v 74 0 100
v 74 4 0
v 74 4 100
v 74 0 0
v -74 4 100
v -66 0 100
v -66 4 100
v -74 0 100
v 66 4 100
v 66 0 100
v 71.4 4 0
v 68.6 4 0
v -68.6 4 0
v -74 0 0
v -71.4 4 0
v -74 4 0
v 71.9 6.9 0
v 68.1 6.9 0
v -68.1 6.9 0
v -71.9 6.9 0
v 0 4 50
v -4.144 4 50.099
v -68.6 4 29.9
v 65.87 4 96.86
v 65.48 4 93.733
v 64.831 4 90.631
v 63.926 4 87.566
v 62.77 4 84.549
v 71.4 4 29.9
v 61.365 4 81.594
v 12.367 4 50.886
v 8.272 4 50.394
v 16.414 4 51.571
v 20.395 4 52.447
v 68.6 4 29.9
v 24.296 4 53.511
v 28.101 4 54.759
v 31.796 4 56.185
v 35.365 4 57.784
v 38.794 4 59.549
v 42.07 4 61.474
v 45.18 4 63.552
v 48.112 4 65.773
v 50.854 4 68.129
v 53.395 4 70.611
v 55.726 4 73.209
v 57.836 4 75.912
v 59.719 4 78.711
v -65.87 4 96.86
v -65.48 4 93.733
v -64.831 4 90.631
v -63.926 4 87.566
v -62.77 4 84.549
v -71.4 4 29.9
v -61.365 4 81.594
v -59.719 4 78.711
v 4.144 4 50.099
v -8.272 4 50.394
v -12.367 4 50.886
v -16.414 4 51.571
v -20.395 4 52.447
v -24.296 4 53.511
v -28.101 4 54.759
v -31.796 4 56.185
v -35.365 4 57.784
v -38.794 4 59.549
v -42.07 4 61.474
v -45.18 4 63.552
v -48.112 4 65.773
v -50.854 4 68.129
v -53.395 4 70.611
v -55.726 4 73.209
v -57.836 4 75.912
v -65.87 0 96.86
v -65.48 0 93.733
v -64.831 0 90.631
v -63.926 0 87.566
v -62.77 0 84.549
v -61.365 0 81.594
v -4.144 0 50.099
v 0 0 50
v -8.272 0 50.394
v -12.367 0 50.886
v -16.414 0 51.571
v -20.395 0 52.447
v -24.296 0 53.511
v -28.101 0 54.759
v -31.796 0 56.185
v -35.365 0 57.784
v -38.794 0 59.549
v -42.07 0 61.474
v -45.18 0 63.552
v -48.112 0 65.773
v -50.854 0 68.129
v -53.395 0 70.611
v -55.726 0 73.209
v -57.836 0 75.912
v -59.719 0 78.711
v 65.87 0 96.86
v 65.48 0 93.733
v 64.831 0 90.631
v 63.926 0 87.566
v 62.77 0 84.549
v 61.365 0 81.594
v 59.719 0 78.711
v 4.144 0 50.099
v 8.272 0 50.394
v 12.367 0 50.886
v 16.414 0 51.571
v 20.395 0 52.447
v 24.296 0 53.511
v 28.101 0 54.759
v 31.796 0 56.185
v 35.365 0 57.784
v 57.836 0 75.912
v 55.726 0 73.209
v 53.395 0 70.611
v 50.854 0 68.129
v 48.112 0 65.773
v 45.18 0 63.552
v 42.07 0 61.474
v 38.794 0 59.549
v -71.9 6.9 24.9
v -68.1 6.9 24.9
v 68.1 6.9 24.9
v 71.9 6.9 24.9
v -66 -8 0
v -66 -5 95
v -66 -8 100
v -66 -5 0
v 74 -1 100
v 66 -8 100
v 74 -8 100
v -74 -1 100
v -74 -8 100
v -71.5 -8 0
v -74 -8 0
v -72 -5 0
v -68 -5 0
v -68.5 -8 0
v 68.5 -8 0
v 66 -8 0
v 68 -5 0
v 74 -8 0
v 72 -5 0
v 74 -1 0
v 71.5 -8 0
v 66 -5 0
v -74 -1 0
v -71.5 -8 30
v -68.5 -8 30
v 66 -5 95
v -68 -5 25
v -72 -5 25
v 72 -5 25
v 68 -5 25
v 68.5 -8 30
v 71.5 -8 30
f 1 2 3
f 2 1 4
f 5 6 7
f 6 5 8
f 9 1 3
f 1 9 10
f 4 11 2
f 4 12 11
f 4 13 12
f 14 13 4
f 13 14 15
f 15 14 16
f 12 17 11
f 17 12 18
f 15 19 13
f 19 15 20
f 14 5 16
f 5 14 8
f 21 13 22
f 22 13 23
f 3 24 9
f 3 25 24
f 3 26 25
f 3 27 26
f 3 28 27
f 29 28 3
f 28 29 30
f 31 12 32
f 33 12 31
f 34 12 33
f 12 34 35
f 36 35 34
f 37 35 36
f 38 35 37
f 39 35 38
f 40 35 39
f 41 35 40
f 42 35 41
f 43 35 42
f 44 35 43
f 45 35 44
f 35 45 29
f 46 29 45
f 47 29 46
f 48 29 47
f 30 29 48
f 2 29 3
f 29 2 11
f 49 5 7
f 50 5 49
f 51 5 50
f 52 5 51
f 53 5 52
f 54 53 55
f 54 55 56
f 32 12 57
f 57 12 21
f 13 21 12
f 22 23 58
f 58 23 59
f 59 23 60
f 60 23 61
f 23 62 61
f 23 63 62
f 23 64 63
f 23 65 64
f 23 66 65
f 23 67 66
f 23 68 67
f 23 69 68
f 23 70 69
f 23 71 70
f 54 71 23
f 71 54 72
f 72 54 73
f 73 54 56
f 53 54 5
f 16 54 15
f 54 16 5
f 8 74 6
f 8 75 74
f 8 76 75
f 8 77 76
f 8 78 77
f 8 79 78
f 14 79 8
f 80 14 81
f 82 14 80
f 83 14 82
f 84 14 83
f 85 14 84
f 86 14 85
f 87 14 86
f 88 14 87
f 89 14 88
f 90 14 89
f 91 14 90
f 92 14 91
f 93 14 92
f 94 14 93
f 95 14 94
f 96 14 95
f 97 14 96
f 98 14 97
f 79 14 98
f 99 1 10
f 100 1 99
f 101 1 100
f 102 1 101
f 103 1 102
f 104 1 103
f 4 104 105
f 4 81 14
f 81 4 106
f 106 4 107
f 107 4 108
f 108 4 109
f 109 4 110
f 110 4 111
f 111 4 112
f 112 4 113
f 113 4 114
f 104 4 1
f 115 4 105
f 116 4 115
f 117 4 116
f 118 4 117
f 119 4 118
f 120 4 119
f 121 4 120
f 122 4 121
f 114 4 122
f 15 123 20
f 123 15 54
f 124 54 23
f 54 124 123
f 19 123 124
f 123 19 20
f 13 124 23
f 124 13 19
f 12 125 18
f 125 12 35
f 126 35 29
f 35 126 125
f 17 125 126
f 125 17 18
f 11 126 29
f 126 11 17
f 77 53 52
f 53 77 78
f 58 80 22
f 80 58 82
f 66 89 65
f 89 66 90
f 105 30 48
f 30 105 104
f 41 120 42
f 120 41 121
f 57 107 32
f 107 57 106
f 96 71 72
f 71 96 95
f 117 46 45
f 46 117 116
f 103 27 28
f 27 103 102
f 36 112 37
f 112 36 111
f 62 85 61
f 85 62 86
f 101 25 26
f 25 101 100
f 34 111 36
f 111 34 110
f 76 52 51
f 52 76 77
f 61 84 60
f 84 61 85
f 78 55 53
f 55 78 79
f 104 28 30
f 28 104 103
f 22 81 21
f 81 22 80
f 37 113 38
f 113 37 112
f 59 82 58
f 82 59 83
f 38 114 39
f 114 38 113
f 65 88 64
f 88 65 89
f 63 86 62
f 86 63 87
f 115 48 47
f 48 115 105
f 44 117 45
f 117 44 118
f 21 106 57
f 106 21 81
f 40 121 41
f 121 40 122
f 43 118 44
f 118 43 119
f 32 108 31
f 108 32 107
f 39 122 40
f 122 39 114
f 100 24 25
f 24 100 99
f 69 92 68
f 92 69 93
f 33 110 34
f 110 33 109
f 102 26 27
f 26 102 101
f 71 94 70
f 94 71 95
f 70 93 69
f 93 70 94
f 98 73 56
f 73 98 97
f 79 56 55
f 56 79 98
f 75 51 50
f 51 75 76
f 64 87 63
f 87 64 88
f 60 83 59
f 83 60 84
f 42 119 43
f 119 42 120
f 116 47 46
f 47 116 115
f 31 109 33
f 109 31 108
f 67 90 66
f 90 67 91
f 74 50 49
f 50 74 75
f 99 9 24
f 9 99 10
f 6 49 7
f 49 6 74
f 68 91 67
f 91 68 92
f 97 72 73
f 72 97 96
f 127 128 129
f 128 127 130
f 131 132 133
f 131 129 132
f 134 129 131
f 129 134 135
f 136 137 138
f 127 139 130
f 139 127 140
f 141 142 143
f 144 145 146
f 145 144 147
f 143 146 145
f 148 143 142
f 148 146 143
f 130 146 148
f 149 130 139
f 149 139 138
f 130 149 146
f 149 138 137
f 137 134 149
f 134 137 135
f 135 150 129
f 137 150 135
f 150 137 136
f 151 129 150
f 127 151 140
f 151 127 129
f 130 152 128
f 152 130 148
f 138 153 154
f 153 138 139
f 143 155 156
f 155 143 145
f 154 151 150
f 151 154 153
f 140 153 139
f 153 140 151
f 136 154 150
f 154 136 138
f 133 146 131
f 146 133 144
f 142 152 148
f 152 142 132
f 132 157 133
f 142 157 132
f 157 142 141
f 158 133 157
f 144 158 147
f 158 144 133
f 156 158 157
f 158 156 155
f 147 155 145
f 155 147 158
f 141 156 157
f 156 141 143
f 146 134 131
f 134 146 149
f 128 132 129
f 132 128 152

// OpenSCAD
// file: constants.scad
// Copyright Ian G. Clifton 2026
// Apache 2.0 license
// https://github.com/IanGClifton/modular-paint-stack

GRIDFINITY_DIMENSION = 42;
CIRCLE_RESOLUTION = 100;

SHELF_SUPPORT_WIDTH = 3;
SHELF_SUPPORT_BLOCK_PROTRUSION = 9;
SHELF_SUPPORT_BLOCK_X = 3;
SHELF_SUPPORT_BLOCK_Y = 3.8;
SHELF_SUPPORT_ANGLE_X = 2.9;
SHELF_SUPPORT_ANGLE_Y = (GRIDFINITY_DIMENSION - SHELF_SUPPORT_BLOCK_Y) / 2;
SHELF_SUPPORT_ANGLE_PROTRUSION = 4.9;
SHELF_SUPPORT_SPACING = 2;
SHELF_SUPPORT_ANGLE_CUT = 0.4;

SHELF_THICKNESS = 3;
SHELF_MIN_BACK_RAIL = 8;

SIDE_X = 8;
SIDE_Y = GRIDFINITY_DIMENSION;

DOVETAIL_XMIN = 3.0;
DOVETAIL_XMAX = 4.0;
DOVETAIL_YDEPTH = 3.0;
DOVETAIL_ZDIFF = 5.0;
DOVETAIL_ZMAX = 30.0;
DOVETAIL_ZMIN = DOVETAIL_ZMAX - DOVETAIL_ZDIFF;
DOVETAIL_OFFSET = (SIDE_X / 2) - (DOVETAIL_XMAX / 2);

SHELF_BRACKET_WIDTH = 2;
SHELF_BRACKET_OPENING_HEIGHT = 5;
SHELF_BRACKET_OPENING_WIDTH = 3;
SHELF_BRACKET_CONNECTION_HEIGHT = 4;
SHELF_BRACKET_Y_DEPTH = 19;
SHELF_BRACKET_Y_GAP = 4;

CUTOUT_SHAPE_NONE = 0;
CUTOUT_SHAPE_OVAL = 1;
CUTOUT_SHAPE_RECTANGLE = 2;
CUTOUT_SHAPE_ANGLED_RECTANGLE = 3;

function getShelfMainWidth(gridfinityUnits) = GRIDFINITY_DIMENSION * gridfinityUnits;

function getShelfFullWidth(gridfinityUnits) = (SHELF_SUPPORT_WIDTH * 2) + getShelfMainWidth(gridfinityUnits);
// file: dovetail.scad
// Copyright Ian G. Clifton 2026
// Apache 2.0 license
// https://github.com/IanGClifton/modular-paint-stack

include <constants.scad>

/**
  * Creates the dovetail shape for connecting pieces
  *
  * Top view
  * ____
  * \__/
  *
  * Side view
  * 
  * |\
  * | \
  * |  |
  * |  |
  * |  |
  * |__|
  *
  * xMin thinnest part of the x dimension where the dovetail connects
  * xMax thickest part of the x dimension on the outside of the dovetail
  * yDepth how far out the dovetail protrudes
  * zMin lowest part of the height/z dimension
  * zMax highest part of the height/z dimension
  * inset how much to "shrink" the dovetail for fitting in another piece
  */
module dovetail(xMin, xMax, yDepth, zMin, zMax, inset = 0) {
    points = [
        // Base
        [0 + inset, yDepth - inset, 0],               // 0 TL
        [xMax - inset, yDepth - inset, 0],            // 1 TR
        [((xMax - xMin) / 2) + inset, 0, 0],          // 2 BL
        [(((xMax - xMin) / 2) + xMin) - inset, 0, 0], // 3 BR
        // Top
        [0 + inset, yDepth - inset, zMin - inset],              // 4 TL
        [xMax - inset, yDepth - inset, zMin - inset],           // 5 TR
        [((xMax - xMin) / 2) + inset, 0, zMax - inset],         // 6 BL
        [(((xMax - xMin) / 2) + xMin) - inset, 0, zMax - inset] // 7 BR
    ];
    
    faces = [
        [0, 2, 3, 1], // Bottom
        [4, 5, 7, 6], // Top
        [6, 7, 3, 2], // Front
        [4, 6, 2, 0], // Left
        [4, 0, 1, 5], // Back
        [7, 5, 1, 3], // Right
        
    ];
    polyhedron(points, faces);
}

/**
 * Creates a dovetail using the default constants
 */
module dovetailDefault(inset = 0) {
    dovetail(
        xMin = DOVETAIL_XMIN,
        xMax = DOVETAIL_XMAX,
        yDepth = DOVETAIL_YDEPTH,
        zMin = DOVETAIL_ZMIN,
        zMax = DOVETAIL_ZMAX,
        inset = inset
    );
}

module dovetailSlot(height) {
    difference() {
        cube([SIDE_X, DOVETAIL_YDEPTH, height]);
        rotate([0, 0, 180]) {
            translate([-DOVETAIL_XMAX - DOVETAIL_OFFSET, -DOVETAIL_YDEPTH, 0]) {
                dovetailDefault();
            }
        }
    }
}
// main file
// Copyright Ian G. Clifton 2026
// Apache 2.0 license
// https://github.com/IanGClifton/modular-paint-stack

// Whether to generate the front piece
print_front = true;
// Whether to generate the back piece
print_back = true;
// mm from 30 to printer max Z dimension
front_height = 100;
// mm thickness of the front piece
front_thickness = 4;
// mm from 30 to printy max Z dimension
back_height = 100;
// mm thickness of the back piece
back_thickness = 4;
// Cutout (0 = none, 1 = oval, 2 = rectangle, 3 = angled rectangle)
cutout_shape_front = 1;
// Cutout (0 = none, 1 = oval, 2 = rectangle, 3 = angled rectangle)
cutout_shape_back = 0;
// mm offset to make the dovetail fit (0.05 = extremely tight, 0.10 = tight)
dovetail_clearance = 0.10;
// Gridfinity units (42mm each) to make the width of the main shelf part 
shelf_gridfinity_unit_width = 3;

include <dovetail.scad>


SHELF_FULL_WIDTH = getShelfFullWidth(shelf_gridfinity_unit_width);
FULL_WIDTH = SHELF_FULL_WIDTH + (2 * SIDE_X);


module front(width, depth, height) {
    union() {
        cube([width, depth, height]);
        translate([DOVETAIL_OFFSET, depth, 0])
            dovetailDefault(inset = dovetail_clearance);
        translate([width - SIDE_X + DOVETAIL_OFFSET, depth, 0])
            dovetailDefault(inset = dovetail_clearance);
    }
}

module back(width, depth, height, includeTopTriangle) {
    union() {
        cube([width, depth, height]);
        translate([0, depth, 0])
            dovetailSlot(height);
        translate([width - SIDE_X, depth, 0])
            dovetailSlot(height);

        if (includeTopTriangle) {
            // Hide the top gap with a triangle
            triangleWidth = width - (2 * SIDE_X);
            triangleHeight = 5;
            points = [
                // Left
                [0, 0, triangleHeight],               // 0 Top front
                [0, DOVETAIL_YDEPTH, triangleHeight], // 1 Top back
                [0, 0, 0],                            // 2 Bottom front
                // Right
                [triangleWidth, 0, triangleHeight],               // 3 Top front
                [triangleWidth, DOVETAIL_YDEPTH, triangleHeight], // 4 Top back
                [triangleWidth, 0, 0],                            // 5 Bottom front
            ];
            faces = [
                [0, 2, 1],    // Left
                [0, 3, 5, 2], // Front
                [4, 1, 2, 5], // Back angle
                [3, 4, 5],    // Right
                [3, 0, 1, 4]  // Top
            ];
            translate([SIDE_X, depth, height - triangleHeight])
                polyhedron(points, faces);
        }
    }
}

module cutoutShape(width, depth, height, shape) {
    if (shape == CUTOUT_SHAPE_OVAL) {
        yScale = height / width;
        rotate([90, 0, 0]) {
            translate([SIDE_X + (width / 2), height, -depth]) {
                scale([1, yScale, 1]) {
                    cylinder(h = depth, r = width/2, center = false, $fn=CIRCLE_RESOLUTION);
                }
            }
        }
    } else if (shape == CUTOUT_SHAPE_RECTANGLE) {
        cutout_height = height / 3;
        translate([SIDE_X, 0, height - cutout_height]) {
            cube([width, depth, cutout_height]);
        }
    } else if (shape == CUTOUT_SHAPE_ANGLED_RECTANGLE) {
        cutout_height = height / 3;
        cutout_inset = width / 8;
        translate([SIDE_X, 0, height - cutout_height]) {
            points = [
                // Front
                [0, 0, cutout_height],        // 0 TL
                [width, 0, cutout_height],    // 1 TR
                [cutout_inset, 0, 0],         // 2 BL
                [width - cutout_inset, 0, 0], // 3 BR
                // Back
                [0, depth, cutout_height],        // 4 TL
                [width, depth, cutout_height],    // 5 TR
                [cutout_inset, depth, 0],         // 6 BL
                [width - cutout_inset, depth, 0], // 7 BR
            ];
            faces = [
                [0, 1, 3, 2], // Front
                [4, 0, 2, 6], // Left
                [4, 6, 7, 5], // Back
                [1, 5, 7, 3], // Right
                [0, 4, 5, 1], // Top
                [2, 3, 7, 6]  // Bottom
            ];
            polyhedron(points, faces);
        }
        
    }
}

module cutoutShapeFront() {
    cutoutShape(
        width = SHELF_FULL_WIDTH,
        depth = front_thickness,
        height = front_height,
        shape = cutout_shape_front
    );
}

module cutoutShapeBack() {
    cutoutShape(
        width = SHELF_FULL_WIDTH,
        depth = back_thickness,
        height = back_height,
        shape = cutout_shape_back
    );
}

translate([-(FULL_WIDTH / 2), 0, 0]) {
    if (print_front) {
        difference() {
            front(
                width = FULL_WIDTH,
                depth = front_thickness,
                height = front_height
            );
            cutoutShapeFront();
        }
    }

    if (print_back) {
        translate([0, -1, 0]) {
            mirror([0, 1,0]) {        
                difference() {
                    back(
                        width = FULL_WIDTH,
                        depth = back_thickness,
                        height = back_height,
                        includeTopTriangle = (cutout_shape_back == CUTOUT_SHAPE_NONE)
                    );
                    cutoutShapeBack();
                }
            }
        }
    }
}
